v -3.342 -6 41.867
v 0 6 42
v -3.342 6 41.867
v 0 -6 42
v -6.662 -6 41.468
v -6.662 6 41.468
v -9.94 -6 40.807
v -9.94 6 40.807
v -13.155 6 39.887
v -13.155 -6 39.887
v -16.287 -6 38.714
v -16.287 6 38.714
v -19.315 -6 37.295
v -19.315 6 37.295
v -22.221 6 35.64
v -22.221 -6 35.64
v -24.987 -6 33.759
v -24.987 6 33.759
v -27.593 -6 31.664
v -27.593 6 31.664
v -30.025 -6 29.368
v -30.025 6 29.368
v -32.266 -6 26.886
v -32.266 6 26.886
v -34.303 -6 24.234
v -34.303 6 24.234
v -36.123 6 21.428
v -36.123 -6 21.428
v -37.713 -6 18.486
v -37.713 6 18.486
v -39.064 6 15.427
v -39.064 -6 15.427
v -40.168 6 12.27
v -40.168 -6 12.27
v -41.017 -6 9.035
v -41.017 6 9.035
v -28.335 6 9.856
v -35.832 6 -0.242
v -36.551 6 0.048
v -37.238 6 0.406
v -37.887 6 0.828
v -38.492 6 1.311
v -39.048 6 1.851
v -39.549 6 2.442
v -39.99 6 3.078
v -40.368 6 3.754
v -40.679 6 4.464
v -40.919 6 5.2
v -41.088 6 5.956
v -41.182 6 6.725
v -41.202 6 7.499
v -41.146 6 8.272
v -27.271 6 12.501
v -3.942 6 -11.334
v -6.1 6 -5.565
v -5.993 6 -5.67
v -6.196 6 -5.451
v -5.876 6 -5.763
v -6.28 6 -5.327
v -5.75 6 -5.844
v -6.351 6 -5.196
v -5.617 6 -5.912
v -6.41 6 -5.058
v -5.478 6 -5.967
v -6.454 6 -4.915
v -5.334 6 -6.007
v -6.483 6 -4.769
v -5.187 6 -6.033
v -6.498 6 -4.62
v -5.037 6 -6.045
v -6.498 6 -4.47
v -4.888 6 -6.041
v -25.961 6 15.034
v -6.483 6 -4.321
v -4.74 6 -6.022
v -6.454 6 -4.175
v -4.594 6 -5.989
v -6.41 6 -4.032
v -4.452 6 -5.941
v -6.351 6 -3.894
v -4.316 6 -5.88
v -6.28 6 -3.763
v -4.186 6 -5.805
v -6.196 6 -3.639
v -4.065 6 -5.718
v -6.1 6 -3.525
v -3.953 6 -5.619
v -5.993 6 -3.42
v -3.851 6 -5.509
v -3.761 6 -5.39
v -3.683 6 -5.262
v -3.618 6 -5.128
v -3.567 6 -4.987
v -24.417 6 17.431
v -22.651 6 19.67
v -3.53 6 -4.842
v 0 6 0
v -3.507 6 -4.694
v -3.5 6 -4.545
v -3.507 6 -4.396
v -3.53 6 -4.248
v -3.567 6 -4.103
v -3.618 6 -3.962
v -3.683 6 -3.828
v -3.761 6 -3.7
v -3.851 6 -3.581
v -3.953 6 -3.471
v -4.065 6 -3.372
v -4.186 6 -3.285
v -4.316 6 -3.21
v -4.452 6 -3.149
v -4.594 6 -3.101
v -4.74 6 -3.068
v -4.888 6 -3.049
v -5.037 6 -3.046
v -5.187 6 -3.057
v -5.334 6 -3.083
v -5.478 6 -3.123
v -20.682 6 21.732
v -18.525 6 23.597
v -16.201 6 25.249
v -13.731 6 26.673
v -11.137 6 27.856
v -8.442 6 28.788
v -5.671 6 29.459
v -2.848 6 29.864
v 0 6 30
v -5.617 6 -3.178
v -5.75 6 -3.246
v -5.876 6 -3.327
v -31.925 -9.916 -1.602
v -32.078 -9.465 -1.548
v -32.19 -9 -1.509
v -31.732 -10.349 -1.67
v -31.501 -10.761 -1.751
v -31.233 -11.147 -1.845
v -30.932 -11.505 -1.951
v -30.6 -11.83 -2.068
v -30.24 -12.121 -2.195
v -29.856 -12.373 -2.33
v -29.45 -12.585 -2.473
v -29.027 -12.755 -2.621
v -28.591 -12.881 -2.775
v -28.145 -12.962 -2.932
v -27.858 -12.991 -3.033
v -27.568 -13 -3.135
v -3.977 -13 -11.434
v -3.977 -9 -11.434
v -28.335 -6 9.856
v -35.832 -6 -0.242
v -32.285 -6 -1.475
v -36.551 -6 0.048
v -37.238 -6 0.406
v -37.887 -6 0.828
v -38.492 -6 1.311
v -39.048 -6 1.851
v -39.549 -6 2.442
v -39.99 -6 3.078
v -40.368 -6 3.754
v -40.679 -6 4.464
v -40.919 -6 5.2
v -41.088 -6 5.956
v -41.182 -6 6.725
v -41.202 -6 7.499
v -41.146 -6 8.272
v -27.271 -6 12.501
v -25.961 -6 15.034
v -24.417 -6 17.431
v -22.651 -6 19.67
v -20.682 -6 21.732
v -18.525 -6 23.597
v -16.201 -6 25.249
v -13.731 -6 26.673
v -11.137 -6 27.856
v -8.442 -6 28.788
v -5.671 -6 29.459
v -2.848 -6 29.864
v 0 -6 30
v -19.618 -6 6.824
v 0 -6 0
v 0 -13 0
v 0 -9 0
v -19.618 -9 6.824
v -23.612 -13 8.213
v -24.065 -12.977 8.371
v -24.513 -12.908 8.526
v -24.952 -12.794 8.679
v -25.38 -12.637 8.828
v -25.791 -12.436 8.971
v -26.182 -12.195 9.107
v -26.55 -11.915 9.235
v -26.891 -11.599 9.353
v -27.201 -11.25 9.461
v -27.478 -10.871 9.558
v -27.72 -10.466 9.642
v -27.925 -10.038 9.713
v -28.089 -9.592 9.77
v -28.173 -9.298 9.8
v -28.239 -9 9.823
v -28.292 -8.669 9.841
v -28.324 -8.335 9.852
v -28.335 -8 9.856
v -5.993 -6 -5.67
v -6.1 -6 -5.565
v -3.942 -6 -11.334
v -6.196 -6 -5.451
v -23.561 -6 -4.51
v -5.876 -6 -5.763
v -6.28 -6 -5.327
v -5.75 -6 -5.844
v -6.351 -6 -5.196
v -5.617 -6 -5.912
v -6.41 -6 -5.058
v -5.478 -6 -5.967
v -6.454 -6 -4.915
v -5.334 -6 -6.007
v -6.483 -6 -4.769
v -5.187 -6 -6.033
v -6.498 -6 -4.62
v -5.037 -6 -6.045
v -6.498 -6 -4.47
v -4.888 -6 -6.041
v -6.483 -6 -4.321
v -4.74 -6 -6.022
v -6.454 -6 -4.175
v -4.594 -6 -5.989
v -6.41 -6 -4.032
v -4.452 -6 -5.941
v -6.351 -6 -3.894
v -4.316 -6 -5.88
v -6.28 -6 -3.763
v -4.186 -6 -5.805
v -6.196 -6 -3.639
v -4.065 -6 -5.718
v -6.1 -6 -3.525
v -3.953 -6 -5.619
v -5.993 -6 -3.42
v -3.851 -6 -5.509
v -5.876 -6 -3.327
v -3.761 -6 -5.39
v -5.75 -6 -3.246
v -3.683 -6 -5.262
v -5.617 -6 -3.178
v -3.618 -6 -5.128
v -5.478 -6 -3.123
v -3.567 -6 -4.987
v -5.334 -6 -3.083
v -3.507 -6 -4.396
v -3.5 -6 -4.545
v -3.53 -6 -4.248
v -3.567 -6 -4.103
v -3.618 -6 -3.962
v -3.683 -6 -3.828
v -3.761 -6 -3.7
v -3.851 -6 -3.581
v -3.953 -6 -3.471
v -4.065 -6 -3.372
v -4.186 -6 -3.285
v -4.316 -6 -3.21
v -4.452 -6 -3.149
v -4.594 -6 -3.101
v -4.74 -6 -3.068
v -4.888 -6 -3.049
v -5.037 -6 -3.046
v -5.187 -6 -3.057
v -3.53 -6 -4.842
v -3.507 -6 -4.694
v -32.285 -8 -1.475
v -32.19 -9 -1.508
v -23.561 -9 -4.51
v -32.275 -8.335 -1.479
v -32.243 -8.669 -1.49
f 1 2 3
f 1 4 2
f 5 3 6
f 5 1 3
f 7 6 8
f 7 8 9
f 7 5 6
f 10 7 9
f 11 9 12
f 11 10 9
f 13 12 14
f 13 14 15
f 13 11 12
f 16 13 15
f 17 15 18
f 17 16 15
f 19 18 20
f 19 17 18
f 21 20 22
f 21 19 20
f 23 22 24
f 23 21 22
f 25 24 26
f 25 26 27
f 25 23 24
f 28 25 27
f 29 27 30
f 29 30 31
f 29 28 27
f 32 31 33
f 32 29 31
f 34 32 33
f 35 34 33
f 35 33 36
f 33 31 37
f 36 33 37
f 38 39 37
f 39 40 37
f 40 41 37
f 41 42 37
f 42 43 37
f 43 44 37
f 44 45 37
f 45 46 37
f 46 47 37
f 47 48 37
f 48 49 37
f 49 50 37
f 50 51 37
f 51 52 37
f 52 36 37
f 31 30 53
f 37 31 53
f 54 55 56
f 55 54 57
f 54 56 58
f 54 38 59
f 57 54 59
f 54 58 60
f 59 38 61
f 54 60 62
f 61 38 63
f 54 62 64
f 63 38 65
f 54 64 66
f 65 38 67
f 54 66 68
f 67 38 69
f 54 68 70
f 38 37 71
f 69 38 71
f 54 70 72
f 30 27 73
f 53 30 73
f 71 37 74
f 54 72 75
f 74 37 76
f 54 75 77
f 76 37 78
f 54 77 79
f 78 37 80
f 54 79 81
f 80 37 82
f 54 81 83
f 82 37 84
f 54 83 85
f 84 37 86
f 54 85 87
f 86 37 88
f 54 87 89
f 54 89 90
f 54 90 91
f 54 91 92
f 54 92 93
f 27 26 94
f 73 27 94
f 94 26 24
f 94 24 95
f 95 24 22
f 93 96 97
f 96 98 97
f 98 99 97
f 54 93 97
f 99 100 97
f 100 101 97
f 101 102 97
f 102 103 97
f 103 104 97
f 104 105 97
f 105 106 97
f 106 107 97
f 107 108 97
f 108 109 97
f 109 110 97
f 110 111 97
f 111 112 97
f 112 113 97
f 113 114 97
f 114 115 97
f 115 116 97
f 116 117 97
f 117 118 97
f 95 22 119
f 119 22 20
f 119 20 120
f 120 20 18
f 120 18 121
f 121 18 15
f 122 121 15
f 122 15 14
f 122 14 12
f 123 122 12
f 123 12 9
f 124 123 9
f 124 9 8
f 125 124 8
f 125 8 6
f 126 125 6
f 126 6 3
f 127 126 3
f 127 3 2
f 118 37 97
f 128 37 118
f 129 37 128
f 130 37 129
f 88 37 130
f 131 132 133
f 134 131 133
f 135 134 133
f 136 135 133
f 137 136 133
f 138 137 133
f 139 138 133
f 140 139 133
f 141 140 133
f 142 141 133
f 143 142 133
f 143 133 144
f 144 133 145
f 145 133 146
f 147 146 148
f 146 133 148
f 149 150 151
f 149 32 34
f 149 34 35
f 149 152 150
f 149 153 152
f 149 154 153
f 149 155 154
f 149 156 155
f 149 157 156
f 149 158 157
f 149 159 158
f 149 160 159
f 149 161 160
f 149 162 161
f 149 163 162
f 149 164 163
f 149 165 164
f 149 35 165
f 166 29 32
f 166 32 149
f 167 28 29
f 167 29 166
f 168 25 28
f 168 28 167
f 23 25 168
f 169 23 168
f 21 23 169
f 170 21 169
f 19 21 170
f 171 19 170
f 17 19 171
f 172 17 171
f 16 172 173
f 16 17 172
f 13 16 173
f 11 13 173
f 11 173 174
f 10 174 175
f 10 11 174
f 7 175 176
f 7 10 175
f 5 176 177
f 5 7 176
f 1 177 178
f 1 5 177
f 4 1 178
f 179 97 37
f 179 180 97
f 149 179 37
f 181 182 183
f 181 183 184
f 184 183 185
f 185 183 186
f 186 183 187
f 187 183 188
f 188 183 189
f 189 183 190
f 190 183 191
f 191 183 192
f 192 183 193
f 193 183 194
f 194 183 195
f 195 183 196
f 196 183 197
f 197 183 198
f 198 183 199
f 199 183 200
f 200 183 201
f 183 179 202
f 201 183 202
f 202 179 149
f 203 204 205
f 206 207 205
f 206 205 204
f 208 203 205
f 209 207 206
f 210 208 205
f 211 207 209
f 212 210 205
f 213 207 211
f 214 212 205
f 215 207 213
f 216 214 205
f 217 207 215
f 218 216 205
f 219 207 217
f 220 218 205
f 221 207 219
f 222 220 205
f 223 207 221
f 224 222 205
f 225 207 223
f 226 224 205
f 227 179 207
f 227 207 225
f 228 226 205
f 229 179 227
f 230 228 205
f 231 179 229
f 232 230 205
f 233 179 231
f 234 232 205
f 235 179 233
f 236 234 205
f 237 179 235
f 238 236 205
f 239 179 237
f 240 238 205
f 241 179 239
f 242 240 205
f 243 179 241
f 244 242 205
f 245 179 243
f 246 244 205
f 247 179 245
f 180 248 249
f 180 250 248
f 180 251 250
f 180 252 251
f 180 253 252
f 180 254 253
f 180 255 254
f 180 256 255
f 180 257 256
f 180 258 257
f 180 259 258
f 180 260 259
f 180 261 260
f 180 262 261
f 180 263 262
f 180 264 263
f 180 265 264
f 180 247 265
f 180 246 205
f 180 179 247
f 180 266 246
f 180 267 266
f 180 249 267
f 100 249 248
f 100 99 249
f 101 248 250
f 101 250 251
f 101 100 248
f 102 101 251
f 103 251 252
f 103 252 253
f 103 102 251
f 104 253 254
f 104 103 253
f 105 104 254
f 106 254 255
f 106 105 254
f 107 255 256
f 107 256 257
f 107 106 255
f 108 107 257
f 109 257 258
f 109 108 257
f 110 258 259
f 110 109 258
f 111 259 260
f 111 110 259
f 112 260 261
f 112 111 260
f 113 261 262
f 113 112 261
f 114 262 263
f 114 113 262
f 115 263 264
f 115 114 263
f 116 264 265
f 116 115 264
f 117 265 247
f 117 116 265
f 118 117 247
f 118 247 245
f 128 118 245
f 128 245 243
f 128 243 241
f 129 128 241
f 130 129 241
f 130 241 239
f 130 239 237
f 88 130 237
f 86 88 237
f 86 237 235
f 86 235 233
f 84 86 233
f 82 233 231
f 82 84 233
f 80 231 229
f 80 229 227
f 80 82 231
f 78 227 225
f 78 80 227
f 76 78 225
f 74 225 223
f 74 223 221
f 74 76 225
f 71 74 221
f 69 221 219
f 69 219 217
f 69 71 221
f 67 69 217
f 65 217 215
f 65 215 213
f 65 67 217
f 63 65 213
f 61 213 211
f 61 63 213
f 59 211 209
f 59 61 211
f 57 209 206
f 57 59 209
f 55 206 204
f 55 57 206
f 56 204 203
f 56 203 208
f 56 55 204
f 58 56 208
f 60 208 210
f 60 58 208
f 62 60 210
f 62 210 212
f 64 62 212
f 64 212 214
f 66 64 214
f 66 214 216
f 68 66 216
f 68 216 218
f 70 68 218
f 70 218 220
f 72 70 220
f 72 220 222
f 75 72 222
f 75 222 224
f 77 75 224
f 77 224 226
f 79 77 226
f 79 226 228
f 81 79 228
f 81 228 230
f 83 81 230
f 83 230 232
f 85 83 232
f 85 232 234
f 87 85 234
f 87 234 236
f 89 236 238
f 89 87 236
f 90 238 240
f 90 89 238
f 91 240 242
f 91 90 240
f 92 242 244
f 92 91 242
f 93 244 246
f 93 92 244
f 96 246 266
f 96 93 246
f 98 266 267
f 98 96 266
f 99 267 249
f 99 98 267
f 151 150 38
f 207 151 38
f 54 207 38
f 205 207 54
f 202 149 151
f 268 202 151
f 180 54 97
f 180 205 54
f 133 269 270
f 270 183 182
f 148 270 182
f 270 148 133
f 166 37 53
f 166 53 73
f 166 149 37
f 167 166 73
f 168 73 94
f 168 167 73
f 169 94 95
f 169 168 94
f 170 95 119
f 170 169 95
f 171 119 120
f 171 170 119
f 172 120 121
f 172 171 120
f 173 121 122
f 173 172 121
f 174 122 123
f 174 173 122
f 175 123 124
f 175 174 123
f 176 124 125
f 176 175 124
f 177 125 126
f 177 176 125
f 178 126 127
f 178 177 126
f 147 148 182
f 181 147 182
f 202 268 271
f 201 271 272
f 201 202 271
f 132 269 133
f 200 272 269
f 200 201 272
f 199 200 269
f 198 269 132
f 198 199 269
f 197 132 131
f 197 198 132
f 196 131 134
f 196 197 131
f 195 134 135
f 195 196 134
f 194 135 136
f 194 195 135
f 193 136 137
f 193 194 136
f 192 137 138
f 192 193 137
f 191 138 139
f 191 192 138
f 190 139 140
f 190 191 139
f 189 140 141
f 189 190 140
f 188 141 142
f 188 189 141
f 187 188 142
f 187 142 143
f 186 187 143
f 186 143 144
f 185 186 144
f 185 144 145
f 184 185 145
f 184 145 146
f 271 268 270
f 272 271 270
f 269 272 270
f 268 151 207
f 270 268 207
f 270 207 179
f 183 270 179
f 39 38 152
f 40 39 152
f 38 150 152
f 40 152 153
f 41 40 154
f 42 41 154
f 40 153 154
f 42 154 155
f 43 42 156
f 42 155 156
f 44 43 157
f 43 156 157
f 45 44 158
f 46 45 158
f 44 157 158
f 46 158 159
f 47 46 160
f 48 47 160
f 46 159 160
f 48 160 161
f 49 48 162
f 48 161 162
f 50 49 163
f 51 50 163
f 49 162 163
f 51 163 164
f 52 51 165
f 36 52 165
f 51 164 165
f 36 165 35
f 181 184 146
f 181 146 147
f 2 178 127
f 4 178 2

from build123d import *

# Parameters (mm, degrees)
F0_R        = 1.5
F1_DEPTH    = 6
F3_DEPTH    = 3
F5_DEPTH    = 4
F6_R        = 8
F7_T1_DEPTH = 37.0000029882


# Not quite as in the source:
# - a fillet or chamfer that OpenCascade refuses, or shapes differently, is made with other operations: its cross-section is extruded or revolved along the edge and cut away or added


with BuildPart() as f1:
    # F0 (on Front) → F1 (new body, symmetric)
    with BuildSketch(Plane.XZ):
        with BuildLine():
            ThreePointArc((-28.3348189516, 9.855862975), (-17.3828091911, 24.4507248282), (0, 30))
            Line((0, 30), (0, 42))
            ThreePointArc((0, 42), (-29.0229029625, 30.3590366057), (-41.9574939735, 1.8891001728))
            Line((-41.9574939735, 1.8891001728), (-3.94234519, -11.3339275806))
            Line((-3.94234519, -11.3339275806), (0, 0))
            Line((0, 0), (-28.3348189516, 9.855862975))
        make_face()
        with Locations((-5, -4.5450530015)):
            Circle(F0_R, mode=Mode.SUBTRACT)
    extrude(amount=F1_DEPTH, both=True)

    # F2 (on face) → F3 (join)
    with BuildSketch(Plane.XZ.offset(6)):
        Polygon((-19.6181767132, 6.8239031926), (-28.3348189516, 9.855862975), (-32.2851626761, -1.4752824294), (-23.5605219032, -4.5100243881), align=None)
    extrude(amount=F3_DEPTH)

    # F4 (on face) → F5 (join)
    with BuildSketch(Plane.XZ.offset(9)):
        Polygon((0, 0), (-28.3348189516, 9.855862975), (-32.2851626761, -1.4752824294), (-3.9770946697, -11.4338295597), align=None)
    extrude(amount=F5_DEPTH)

    # F6
    f6_edges = [f1.edges().sort_by_distance(p)[0] for p in [
        (-41.957494, 0, 1.8891),
    ]]
    fillet(f6_edges, radius=F6_R)

    # F7: fillet of radius 5 on 1 edges, made by hand

    # F7_s2 → F7_t1 (cut)
    with BuildSketch(Plane(origin=(4.1079708061, 0, 11.783282106), x_dir=(0, 1, 0), z_dir=(-0.3291952284, 0, -0.9442618819))):
        with BuildLine():
            ThreePointArc((-8, -29.9999925295), (-11.5355339059, -28.5355264354), (-13, -24.9999925295))
            Line((-13, -24.9999925295), (-13, -29.9999925295))
            Line((-13, -29.9999925295), (-8, -29.9999925295))
        make_face()
    extrude(amount=F7_T1_DEPTH, mode=Mode.SUBTRACT)


solid = f1.part
